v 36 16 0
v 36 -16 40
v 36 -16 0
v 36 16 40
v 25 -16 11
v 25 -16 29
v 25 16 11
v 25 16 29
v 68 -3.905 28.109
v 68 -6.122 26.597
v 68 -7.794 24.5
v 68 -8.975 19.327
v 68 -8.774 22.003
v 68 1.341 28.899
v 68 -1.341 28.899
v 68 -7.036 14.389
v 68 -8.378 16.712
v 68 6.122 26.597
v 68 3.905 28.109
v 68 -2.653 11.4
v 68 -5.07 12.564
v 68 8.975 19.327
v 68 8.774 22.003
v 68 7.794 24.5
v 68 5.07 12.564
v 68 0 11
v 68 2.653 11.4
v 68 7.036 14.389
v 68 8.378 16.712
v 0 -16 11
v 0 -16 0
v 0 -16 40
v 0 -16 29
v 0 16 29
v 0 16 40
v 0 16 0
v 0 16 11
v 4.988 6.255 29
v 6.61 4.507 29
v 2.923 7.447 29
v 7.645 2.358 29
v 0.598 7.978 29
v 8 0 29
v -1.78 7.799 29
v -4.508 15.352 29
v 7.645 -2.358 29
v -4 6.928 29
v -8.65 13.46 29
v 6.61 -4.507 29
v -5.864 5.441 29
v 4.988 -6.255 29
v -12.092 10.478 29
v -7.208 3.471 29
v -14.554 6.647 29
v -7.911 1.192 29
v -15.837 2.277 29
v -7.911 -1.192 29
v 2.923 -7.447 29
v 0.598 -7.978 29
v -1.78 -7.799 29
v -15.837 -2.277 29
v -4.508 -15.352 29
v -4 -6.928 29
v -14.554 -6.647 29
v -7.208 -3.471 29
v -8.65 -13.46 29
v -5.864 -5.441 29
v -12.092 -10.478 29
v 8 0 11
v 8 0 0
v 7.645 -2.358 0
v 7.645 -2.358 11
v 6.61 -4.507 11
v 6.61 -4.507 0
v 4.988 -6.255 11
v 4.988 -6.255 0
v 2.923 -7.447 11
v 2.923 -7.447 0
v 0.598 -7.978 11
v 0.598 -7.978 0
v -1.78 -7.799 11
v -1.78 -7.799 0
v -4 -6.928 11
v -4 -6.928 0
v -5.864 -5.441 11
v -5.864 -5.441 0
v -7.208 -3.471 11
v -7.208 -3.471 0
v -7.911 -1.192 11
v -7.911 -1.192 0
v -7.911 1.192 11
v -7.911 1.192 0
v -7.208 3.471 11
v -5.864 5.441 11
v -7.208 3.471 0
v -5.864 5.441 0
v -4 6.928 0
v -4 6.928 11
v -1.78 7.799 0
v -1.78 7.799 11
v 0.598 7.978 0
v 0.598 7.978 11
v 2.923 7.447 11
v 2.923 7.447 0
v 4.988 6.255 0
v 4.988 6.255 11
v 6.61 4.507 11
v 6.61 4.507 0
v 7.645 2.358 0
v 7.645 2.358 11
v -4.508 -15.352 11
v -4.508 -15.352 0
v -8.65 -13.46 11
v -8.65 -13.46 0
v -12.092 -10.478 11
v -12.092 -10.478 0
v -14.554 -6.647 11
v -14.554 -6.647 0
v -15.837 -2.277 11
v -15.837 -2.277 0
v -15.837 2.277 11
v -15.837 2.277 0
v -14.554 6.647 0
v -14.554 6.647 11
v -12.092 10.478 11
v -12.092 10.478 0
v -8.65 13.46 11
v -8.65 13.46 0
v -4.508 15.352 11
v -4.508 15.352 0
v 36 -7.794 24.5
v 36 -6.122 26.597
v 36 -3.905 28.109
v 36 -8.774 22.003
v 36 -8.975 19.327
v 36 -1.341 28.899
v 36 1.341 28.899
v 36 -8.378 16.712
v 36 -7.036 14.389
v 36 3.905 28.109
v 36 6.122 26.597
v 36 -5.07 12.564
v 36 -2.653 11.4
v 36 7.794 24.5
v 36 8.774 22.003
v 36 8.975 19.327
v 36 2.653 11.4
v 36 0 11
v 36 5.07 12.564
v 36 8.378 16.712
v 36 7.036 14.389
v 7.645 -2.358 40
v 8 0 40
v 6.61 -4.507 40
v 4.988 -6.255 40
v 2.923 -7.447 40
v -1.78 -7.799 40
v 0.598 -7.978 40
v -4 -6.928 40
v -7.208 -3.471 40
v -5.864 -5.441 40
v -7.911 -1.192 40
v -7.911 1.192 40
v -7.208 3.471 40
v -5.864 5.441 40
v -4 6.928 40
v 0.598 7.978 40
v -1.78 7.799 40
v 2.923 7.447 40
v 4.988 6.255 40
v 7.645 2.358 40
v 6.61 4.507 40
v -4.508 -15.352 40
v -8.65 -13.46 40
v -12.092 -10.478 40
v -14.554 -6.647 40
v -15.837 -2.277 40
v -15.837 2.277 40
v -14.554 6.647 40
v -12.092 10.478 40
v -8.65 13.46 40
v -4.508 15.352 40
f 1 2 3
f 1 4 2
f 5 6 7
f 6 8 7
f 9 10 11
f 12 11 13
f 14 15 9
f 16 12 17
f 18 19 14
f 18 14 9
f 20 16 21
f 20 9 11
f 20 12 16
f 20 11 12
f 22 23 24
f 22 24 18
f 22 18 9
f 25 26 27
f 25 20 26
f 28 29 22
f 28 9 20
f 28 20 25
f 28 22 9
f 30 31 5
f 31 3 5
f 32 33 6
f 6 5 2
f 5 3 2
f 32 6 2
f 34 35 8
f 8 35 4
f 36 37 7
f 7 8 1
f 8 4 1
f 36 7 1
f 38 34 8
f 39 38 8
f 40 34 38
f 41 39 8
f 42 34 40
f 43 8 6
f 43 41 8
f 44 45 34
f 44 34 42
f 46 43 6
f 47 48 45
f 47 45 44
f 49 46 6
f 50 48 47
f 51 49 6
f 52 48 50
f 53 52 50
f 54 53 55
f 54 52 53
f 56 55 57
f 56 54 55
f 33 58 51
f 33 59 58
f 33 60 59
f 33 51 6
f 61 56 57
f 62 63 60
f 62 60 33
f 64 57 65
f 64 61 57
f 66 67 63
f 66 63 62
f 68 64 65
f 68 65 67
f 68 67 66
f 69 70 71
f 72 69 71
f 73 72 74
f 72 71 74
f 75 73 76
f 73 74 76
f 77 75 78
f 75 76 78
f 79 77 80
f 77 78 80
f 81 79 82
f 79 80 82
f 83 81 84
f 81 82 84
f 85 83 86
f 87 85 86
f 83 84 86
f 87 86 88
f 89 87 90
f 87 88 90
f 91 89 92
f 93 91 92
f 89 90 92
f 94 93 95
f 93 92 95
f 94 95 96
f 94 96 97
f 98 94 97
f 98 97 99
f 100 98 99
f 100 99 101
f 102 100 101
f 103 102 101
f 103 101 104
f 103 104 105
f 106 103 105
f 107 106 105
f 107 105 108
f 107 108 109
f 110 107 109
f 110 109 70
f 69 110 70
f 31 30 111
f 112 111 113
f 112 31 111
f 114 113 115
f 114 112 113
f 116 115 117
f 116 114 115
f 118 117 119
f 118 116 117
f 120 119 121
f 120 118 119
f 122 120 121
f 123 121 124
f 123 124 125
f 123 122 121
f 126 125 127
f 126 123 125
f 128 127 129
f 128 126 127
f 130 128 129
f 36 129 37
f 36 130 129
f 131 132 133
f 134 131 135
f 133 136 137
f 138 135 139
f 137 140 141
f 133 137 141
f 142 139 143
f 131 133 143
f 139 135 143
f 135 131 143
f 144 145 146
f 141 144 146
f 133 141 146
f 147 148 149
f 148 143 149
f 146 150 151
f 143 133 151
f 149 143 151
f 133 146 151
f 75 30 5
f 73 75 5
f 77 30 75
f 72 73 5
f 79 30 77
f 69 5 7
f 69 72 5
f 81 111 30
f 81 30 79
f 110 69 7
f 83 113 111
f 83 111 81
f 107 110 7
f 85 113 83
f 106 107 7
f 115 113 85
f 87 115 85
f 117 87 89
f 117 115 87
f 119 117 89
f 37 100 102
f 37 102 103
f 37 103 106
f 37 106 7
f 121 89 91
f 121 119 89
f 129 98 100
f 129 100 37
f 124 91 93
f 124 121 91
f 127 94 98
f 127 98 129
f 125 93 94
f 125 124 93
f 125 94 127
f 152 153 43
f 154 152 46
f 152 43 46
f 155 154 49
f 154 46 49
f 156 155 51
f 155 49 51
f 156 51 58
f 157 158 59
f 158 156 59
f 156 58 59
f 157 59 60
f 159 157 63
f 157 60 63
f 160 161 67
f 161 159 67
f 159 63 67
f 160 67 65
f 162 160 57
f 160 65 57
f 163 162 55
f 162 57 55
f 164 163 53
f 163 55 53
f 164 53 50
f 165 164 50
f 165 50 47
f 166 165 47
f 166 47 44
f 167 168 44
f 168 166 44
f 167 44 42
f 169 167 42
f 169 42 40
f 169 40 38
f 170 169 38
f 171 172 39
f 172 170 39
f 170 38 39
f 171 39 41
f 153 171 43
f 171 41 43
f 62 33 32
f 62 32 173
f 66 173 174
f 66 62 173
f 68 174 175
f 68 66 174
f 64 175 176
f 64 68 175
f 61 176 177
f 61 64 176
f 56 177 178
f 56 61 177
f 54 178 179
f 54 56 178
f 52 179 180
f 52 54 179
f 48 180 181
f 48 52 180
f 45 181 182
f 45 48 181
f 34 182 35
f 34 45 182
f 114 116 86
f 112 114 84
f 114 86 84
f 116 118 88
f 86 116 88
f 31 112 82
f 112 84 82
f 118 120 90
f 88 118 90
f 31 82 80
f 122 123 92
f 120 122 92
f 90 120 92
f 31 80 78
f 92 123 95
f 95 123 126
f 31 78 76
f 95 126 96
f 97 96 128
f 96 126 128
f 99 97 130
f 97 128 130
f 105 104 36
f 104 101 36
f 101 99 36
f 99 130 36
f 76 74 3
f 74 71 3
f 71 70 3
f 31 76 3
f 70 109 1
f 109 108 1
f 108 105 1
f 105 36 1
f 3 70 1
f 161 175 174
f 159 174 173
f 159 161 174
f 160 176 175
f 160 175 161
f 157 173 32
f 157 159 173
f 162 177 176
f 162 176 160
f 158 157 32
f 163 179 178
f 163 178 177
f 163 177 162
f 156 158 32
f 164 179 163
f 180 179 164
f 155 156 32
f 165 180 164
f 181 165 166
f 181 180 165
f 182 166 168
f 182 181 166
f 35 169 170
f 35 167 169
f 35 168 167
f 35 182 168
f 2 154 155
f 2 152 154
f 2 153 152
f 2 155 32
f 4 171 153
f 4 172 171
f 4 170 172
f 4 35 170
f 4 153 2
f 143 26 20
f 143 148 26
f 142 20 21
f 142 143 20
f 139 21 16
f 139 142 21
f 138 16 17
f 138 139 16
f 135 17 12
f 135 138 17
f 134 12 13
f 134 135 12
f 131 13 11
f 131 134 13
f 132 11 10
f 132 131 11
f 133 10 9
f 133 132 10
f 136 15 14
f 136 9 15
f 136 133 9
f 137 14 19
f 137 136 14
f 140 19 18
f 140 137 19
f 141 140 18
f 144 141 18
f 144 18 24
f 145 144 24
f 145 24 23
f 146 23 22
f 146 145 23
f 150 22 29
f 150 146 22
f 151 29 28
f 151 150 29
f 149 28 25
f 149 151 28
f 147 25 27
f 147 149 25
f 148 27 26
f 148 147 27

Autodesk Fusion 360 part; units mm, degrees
sketch "Sketch1" plane through (0, 0, 0) normal (0, 0, 1) x (1, 0, 0)
  circle A0 centre (0, 0) radius 8
  line L0 (0, 16) -> (36, 16)
  line L1 (36, 16) -> (36, -16)
  line L2 (36, -16) -> (0, -16)
  arc A1 (0, 16) -> (0, -16) centre (0, 0) ccw
  dimension "d1" = 32
  dimension "d2" = 16
  dimension "d3" = 36
  dimension "d4" = 32
extrude "Extrude1" add sketch "Sketch1" along normal blind 40 makes body 1
sketch "Sketch2" plane through (0, 0, 0) normal (1, 0, 0) x (0, 0, -1)
  line L0 (-11, 16) -> (-29, 16)
  line L1 (-29, 16) -> (-29, -16)
  line L2 (-29, -16) -> (-11, -16)
  line L3 (-11, -16) -> (-11, 16)
  line L4 (0, 16) -> (0, -16)
  dimension "d7" = 18
  dimension "d9" = 11
extrude "Extrude2" cut sketch "Sketch2" along normal mid plane 76 bodies 1 makes body 2 at (26.6667, 0, 29)
sketch "Sketch3" plane through (36, 0, 0) normal (1, 0, 0) x (0, 0, -1)
  line L0 (-11, 16) -> (-11, -16)
  line L1 (-11, -16) -> (0, -16)
  line L2 (0, -16) -> (0, 16)
  line L3 (0, 16) -> (-11, 16)
  line L4 (-29, 16) -> (-11, 16)
  line L5 (-11, 16) -> (-11, -16)
  line L6 (-11, -16) -> (-29, -16)
  line L7 (-29, -16) -> (-29, 16)
  dimension "d12" = 18
  dimension "d13" = 32
extrude "Extrude3" add sketch "Sketch3" against normal blind 11 separate body contours L0 L4 L5 L6 L7 makes body 3
combine "Combine1" operation add target body 3 tool bodies 2 1
sketch "Sketch4" plane through (36, 0, 0) normal (1, 0, 0) x (0, 0, -1)
  line L0 (-40, -16) -> (0, -16)
  line L1 (0, -16) -> (0, 16)
  line L2 (0, 16) -> (-40, 16)
  line L3 (-40, 16) -> (-40, -16)
  circle A0 centre (-20, 0) radius 9
  dimension "d16" = 18
  dimension "d17" = 20
extrude "Extrude4" add sketch "Sketch4" along normal blind 32 separate body contours A0 makes body 4
